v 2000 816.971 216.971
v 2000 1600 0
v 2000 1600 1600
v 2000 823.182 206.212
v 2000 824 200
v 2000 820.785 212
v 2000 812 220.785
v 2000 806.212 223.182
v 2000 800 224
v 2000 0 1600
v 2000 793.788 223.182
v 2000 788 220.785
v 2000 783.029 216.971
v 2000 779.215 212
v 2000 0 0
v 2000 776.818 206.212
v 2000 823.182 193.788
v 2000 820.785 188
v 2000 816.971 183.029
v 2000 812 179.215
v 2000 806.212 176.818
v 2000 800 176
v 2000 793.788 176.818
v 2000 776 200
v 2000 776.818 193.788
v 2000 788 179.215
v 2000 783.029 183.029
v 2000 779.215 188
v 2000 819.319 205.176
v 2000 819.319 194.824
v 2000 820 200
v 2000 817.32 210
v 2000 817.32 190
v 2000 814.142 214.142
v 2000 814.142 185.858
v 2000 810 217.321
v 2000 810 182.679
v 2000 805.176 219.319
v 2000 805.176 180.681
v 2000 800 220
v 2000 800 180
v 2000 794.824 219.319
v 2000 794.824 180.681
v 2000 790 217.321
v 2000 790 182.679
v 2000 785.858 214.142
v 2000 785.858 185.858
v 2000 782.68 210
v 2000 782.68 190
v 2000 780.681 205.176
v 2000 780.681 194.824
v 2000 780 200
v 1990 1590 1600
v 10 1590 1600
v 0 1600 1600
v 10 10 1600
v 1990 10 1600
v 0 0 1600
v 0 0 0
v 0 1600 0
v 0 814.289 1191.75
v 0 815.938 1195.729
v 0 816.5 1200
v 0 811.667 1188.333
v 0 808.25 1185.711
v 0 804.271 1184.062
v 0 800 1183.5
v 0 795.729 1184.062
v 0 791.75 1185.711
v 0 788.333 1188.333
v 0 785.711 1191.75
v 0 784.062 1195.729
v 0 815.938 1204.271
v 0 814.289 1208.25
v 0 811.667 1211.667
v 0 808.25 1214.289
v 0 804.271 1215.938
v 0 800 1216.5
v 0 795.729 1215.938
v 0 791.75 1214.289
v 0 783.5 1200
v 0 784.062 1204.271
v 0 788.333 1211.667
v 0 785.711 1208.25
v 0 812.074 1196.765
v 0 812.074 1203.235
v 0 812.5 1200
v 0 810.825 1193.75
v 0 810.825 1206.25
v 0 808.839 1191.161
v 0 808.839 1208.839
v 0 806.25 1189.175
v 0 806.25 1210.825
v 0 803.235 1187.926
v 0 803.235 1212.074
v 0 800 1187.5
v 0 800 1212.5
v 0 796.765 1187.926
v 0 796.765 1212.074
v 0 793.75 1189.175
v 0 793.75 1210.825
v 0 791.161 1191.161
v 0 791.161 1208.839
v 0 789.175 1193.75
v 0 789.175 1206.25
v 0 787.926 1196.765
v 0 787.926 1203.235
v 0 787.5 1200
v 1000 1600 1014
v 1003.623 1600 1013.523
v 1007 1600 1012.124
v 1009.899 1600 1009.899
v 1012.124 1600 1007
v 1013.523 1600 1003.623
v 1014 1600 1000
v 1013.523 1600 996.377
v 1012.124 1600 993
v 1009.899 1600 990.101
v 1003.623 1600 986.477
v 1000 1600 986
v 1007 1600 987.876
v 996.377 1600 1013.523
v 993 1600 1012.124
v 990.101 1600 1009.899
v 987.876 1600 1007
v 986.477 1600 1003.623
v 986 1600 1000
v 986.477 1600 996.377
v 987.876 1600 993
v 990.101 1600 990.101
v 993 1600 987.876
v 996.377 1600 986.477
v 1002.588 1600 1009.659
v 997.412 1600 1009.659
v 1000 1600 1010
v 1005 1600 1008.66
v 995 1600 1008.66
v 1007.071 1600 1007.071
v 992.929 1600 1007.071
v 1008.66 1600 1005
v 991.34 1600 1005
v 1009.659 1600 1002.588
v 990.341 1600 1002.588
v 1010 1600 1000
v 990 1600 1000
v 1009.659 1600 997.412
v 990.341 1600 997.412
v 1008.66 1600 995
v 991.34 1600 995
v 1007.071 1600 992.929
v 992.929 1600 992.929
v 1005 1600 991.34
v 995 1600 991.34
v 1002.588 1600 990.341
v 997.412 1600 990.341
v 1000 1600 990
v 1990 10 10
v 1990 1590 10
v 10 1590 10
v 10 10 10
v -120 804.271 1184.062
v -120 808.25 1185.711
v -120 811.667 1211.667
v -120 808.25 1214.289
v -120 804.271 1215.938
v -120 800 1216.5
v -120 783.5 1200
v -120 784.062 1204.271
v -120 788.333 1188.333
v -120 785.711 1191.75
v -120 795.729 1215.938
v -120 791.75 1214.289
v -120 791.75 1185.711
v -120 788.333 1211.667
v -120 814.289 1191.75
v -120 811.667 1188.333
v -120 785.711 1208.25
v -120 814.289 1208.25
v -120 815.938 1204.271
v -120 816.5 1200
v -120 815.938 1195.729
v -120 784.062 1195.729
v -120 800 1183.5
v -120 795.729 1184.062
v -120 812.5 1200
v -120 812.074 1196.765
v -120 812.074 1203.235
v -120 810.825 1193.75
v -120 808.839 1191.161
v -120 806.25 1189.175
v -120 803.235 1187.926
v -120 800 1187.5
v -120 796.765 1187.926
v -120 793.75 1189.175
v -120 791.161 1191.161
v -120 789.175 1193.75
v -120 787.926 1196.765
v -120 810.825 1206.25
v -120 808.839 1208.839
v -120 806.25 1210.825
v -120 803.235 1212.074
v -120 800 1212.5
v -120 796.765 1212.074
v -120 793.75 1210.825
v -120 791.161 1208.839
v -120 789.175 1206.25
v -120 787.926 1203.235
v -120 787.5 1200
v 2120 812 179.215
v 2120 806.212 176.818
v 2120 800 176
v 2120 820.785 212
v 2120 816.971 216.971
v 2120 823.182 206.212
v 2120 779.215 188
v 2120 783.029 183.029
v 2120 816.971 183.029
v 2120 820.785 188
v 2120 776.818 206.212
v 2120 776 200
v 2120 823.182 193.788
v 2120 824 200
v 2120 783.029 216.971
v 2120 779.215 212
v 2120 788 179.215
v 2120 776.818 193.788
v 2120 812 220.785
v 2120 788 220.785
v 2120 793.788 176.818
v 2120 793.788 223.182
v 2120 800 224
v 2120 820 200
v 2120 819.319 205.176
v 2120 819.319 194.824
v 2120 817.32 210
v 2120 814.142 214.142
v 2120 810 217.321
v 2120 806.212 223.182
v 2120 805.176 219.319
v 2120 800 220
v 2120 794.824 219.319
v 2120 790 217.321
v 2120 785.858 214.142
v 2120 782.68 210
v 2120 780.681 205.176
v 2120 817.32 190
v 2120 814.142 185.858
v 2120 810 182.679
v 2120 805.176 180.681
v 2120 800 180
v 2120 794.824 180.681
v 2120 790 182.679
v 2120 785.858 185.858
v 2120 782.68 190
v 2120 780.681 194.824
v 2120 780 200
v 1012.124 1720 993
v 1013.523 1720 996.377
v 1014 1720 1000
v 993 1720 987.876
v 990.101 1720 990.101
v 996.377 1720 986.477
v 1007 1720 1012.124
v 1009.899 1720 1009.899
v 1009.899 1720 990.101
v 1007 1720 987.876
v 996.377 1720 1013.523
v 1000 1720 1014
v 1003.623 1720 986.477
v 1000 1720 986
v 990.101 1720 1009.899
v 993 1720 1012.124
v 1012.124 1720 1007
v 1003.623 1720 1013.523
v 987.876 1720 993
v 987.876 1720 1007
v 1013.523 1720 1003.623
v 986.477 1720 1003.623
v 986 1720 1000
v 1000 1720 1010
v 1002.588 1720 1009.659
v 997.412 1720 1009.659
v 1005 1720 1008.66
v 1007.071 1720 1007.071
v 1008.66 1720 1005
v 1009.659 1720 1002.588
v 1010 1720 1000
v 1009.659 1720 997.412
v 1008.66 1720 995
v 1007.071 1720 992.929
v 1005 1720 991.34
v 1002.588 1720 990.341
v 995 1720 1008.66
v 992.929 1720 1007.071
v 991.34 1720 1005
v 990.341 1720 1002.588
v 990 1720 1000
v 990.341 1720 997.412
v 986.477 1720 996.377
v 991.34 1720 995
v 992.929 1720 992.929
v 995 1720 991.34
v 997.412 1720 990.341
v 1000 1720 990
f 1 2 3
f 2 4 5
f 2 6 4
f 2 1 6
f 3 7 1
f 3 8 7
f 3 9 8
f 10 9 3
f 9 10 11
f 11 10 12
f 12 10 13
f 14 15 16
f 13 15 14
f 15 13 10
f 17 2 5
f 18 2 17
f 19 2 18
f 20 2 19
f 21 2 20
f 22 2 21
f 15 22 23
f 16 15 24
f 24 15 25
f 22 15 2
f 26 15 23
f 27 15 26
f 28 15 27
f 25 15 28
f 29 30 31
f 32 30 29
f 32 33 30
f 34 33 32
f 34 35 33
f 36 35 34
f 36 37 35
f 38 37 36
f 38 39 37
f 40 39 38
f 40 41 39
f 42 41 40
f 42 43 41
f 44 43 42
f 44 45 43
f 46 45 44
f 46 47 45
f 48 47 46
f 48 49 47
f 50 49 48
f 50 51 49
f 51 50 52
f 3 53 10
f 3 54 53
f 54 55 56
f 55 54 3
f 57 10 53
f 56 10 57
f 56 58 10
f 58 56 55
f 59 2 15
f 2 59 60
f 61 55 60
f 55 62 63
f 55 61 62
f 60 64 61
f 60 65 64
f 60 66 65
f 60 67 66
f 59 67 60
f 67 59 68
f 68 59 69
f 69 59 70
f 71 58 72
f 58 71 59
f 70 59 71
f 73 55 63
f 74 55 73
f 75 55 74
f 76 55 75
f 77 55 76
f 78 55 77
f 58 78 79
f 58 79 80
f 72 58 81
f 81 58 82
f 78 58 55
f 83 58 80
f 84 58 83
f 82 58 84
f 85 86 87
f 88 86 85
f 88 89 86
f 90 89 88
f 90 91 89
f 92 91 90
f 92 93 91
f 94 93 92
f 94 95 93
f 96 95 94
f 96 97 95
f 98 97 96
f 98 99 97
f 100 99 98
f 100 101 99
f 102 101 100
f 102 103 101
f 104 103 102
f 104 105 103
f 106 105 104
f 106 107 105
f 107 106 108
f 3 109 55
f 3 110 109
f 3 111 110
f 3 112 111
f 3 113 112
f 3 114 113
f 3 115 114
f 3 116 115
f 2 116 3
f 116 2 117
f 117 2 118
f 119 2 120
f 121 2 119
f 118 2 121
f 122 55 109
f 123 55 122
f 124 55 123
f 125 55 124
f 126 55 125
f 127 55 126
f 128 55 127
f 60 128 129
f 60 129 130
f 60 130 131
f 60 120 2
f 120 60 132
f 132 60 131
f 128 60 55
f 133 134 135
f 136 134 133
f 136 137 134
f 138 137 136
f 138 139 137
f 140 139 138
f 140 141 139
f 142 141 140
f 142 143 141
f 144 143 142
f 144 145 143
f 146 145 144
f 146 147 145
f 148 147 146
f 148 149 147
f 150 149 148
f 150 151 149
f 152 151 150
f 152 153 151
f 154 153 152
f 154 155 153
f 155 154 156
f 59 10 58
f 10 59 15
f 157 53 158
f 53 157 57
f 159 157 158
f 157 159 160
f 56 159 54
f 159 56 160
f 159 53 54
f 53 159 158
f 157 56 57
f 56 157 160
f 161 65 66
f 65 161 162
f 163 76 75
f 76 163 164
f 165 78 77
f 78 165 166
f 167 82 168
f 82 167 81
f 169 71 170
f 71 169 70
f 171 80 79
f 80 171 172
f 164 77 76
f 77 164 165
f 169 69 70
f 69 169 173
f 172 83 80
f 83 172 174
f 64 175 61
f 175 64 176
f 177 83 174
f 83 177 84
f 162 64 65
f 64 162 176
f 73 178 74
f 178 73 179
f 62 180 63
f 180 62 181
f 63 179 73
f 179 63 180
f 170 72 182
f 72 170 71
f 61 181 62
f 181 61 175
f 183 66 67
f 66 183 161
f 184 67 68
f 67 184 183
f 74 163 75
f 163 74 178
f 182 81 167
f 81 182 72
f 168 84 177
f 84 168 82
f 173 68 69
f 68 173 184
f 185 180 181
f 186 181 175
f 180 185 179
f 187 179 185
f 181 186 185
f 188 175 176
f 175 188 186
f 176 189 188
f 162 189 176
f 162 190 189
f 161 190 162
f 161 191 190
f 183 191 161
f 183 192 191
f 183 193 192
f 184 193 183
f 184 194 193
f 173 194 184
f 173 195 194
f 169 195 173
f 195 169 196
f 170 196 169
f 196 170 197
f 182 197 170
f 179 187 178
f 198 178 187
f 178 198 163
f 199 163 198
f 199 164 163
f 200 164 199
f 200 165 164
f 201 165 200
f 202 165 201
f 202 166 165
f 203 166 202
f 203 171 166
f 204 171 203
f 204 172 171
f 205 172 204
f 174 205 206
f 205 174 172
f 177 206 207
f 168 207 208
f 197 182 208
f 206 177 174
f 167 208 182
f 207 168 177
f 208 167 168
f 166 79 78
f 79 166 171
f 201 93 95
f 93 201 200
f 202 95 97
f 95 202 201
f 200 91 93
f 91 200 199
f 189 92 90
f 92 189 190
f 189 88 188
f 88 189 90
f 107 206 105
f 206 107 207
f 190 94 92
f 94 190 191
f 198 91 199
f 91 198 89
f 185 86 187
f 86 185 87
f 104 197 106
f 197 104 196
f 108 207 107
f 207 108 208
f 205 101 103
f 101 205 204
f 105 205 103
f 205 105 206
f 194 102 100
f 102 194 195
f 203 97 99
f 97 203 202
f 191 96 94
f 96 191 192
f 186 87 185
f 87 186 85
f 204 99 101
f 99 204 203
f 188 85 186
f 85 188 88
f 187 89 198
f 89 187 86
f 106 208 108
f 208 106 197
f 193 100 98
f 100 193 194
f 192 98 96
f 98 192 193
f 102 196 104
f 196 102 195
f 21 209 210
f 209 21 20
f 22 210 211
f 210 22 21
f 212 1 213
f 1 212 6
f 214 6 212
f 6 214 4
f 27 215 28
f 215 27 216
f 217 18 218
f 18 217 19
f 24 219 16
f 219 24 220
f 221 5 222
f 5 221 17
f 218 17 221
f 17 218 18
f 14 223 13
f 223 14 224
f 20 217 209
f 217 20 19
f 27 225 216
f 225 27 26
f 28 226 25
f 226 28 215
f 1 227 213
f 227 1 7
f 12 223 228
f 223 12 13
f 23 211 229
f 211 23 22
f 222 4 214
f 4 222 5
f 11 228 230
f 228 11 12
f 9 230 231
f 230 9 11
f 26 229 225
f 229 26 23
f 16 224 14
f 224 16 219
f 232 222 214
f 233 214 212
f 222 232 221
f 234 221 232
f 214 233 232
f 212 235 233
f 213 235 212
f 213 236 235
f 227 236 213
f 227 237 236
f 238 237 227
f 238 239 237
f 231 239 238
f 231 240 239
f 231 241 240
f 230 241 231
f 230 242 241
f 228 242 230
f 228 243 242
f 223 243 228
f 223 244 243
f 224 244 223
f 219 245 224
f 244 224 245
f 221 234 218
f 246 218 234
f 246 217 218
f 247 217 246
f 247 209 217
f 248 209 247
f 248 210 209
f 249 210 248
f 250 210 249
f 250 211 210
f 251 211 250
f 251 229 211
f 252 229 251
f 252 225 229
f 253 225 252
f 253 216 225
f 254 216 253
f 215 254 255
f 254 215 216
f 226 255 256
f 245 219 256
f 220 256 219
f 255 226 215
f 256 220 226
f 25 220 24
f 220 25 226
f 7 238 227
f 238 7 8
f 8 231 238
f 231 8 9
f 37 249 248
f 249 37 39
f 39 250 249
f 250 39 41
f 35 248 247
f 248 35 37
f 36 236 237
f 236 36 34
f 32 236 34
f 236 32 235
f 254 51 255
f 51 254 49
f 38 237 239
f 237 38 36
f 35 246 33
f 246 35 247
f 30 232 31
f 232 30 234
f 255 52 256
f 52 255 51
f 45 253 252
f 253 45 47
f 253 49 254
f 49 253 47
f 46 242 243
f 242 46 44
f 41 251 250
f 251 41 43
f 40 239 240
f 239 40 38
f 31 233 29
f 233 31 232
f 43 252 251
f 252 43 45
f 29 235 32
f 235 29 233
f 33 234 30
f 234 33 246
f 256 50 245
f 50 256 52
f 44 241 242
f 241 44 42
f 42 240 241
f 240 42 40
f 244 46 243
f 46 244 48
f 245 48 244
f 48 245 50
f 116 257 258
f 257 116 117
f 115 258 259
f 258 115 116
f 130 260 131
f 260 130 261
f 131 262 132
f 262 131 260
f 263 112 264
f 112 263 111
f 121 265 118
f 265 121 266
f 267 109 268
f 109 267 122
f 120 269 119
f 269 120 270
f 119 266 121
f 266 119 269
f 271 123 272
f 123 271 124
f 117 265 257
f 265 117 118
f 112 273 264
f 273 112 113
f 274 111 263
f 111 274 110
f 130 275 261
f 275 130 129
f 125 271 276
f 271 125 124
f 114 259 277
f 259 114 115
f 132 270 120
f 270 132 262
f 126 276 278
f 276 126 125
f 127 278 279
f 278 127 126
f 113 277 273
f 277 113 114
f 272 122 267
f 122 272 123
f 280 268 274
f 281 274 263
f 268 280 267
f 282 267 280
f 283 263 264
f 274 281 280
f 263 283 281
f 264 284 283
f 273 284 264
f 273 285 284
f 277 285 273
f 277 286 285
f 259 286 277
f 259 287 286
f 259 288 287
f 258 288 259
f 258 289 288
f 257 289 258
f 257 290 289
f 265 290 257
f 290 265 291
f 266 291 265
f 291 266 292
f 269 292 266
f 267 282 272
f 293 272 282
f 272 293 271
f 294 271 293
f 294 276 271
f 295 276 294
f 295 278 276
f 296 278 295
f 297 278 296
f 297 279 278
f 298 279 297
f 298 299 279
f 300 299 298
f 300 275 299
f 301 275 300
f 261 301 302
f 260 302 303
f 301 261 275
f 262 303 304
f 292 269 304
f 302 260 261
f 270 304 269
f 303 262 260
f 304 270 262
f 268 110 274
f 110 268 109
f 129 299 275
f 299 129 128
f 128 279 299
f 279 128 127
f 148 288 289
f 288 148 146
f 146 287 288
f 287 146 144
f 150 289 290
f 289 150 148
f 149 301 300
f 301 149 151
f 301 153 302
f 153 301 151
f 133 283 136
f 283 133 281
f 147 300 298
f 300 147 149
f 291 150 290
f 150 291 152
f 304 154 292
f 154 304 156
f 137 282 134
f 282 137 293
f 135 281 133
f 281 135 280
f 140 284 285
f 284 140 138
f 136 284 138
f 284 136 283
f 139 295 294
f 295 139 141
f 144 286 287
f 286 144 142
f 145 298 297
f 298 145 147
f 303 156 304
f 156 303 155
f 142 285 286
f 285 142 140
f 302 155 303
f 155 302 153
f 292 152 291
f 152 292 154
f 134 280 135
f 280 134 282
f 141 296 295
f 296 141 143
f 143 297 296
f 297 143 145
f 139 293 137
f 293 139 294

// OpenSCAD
// file: ../params.scad
// Shared millimetre parameters. Keep in lockstep with freecad/params.py.
// Module scale: 150 kg/day wet train. Walls are CPVC sheet, not metal.

$fn = 36;

WALL        = 12;     // CPVC sheet thickness
FLOOR       = 16;     // floor plate (trough sits on this)

// LEACH CSTR 1 — inside liquor box
CSTR_L      = 2000;
CSTR_W      = 1200;
CSTR_H      = 1400;   // liquid + freeboard
FREEBOARD   = 200;

// CSTR 2 weir (same vessel, +X wall)
WEIR_W      = 450;
WEIR_CREST  = CSTR_H - FREEBOARD;   // from inner floor
WEIR_SLOT_H = 80;
WEIR_LIP    = 120;    // external spout projection

// CSTR 3 floor auger — injection-molded PVC / FG
AUGER_D     = 140;    // flight OD
AUGER_SHAFT = 40;
AUGER_PITCH = 110;
AUGER_TROUGH_W = 180;
AUGER_TROUGH_H = 110;
AUGER_OFFSET_Y = 280; // trough centreline from inner -Y wall
AUGER_INCLINE  = 28;  // deg, lifts out of liquor toward +X

// mixer / nozzles (lid)
MIXER_D     = 50;
GAS_D       = 80;     // acid-gas takeoff
DROP_X      = 80;     // inner-X of shred drop slot
DROP_L      = 400;
DROP_W      = 250;
DROP_COAM   = 80;     // raised coaming around the slot

// LEACHATE PUMP / coarse strainer — −X wall, opposite the weir
PUMP_D      = 80;     // DN80
PUMP_Z      = 450;    // centreline above inner floor (submerged)
PUMP_Y      = 900;    // centreline from inner −Y (away from auger)
STRAINER_L  = 180;
STRAINER_W  = 140;
STRAINER_H  = 160;

// mezzanine feed train
MEZZ_H      = 2200;   // platform top above tank outer floor
MEZZ_L      = 1600;   // platform length in −X
MEZZ_THK    = 12;
HOPPER_L    = 700;
HOPPER_W    = 600;
HOPPER_H    = 800;
SHRED_L     = 500;
SHRED_W     = 500;
SHRED_H     = 450;
CONV_W      = 240;
CONV_H      = 120;
CONV_PLATE  = 6;      // trough plate
CONV_FLANGE = 40;
CONV_SPRING_D = 50;
CONV_SPRING_H = 80;
CONV_BOLT   = 10;     // M10 clearance
CONV_LEN    = 1800;   // default standalone length; plant instance is computed
DUST_D      = 150;    // dust-hood outlet to DUST header
AUGER_LIFT_L = 700;

// dewater belts + split (Phase A 4–6)
FDEW_L      = 1800;
FDEW_W      = 450;
FDEW_H      = 80;
FDEW_RISE   = 120;    // solids end higher so liquor runs back to weir
SDEW_L      = 1400;
SDEW_W      = 220;
SDEW_H      = 80;
SPLIT_L     = 600;
SPLIT_W     = 500;
SPLIT_H     = 400;
STUB_L      = 400;
STUB_W      = 300;
STUB_H      = 250;

// EW funnel cell
EW_L        = 600;    // along aisle (overflow direction)
EW_W        = 420;    // anode-cathode depth
EW_H        = 650;    // rectangular body
EW_FUNNEL_H = 220;
EW_VALVE_D  = 50;
EW_VALVE_L  = 60;
EW_MEM_T    = 4;      // CEM
EW_SLOT     = 10;     // membrane cassette slot
EW_PITCH    = 750;    // aisle spacing, centre to centre
AISLE_X0    = 200;
AISLE_Y     = -(EW_W + 2*WALL) - 400;
AISLE_Z     = 400;
BUND_H      = 150;
BUND_PAD    = 250;
SUMP_L      = 400;
SUMP_W      = 400;
SUMP_H      = 300;
VDF_D       = 700;
VDF_L       = 900;
PAIL_W      = 180;
HDR_D       = 80;
HDR_Z       = 1400;
PYRO_D      = 320;
PYRO_L      = 2800;

// Campus envelopes — lockstep with freecad/params.py
FARM_X=12000; FARM_Y=8000; FARM_L=12000; FARM_W=8000; FARM_H=4500;
FAB_X=12000;  FAB_Y=-6000; FAB_L=8000;   FAB_W=6000;  FAB_H=4000;
HAB_X=-8000;  HAB_Y=8000;  HAB_L=8000;   HAB_W=6000;  HAB_H=3200;
CRYO_X=-6000; CRYO_Y=-4000; CRYO_L=4000; CRYO_W=3000; CRYO_H=3000;
MFG_X=2000;   MFG_Y=9000;  MFG_L=6000;   MFG_W=4000;  MFG_H=3500;

LIFE_Z_GREY=900; LIFE_Z_UPW=1100; LIFE_Z_ETCH=1300;
LIFE_Z_O2=2800; LIFE_Z_N2=3000; LIFE_Z_CO2=3200;
LIFE_D_GREY=50; LIFE_D_UPW=40; LIFE_D_ETCH=32;
LIFE_D_GAS=25; LIFE_D_CO2=40;
// main file
// HAB WATER — A1–A3 split.
include <../params.scad>;
$fn = 24;
L=2000; W=1600; H=1600; T=10;

module stub(d, l=120) {
    difference() {
        cylinder(h=l, d=d+8);
        translate([0,0,-1]) cylinder(h=l+2, d=d);
    }
}

module mfg_hab_water() {
    difference() {
        cube([L, W, H]);
        translate([T, T, T]) cube([L-2*T, W-2*T, H]);
    }
    translate([0, W/2, 1200]) rotate([0,-90,0]) stub(25); // A1
    translate([L, W/2, 200]) rotate([0,90,0]) stub(40);   // A2 grey
    translate([L/2, W, 1000]) rotate([-90,0,0]) stub(20); // A3
}

mfg_hab_water();
